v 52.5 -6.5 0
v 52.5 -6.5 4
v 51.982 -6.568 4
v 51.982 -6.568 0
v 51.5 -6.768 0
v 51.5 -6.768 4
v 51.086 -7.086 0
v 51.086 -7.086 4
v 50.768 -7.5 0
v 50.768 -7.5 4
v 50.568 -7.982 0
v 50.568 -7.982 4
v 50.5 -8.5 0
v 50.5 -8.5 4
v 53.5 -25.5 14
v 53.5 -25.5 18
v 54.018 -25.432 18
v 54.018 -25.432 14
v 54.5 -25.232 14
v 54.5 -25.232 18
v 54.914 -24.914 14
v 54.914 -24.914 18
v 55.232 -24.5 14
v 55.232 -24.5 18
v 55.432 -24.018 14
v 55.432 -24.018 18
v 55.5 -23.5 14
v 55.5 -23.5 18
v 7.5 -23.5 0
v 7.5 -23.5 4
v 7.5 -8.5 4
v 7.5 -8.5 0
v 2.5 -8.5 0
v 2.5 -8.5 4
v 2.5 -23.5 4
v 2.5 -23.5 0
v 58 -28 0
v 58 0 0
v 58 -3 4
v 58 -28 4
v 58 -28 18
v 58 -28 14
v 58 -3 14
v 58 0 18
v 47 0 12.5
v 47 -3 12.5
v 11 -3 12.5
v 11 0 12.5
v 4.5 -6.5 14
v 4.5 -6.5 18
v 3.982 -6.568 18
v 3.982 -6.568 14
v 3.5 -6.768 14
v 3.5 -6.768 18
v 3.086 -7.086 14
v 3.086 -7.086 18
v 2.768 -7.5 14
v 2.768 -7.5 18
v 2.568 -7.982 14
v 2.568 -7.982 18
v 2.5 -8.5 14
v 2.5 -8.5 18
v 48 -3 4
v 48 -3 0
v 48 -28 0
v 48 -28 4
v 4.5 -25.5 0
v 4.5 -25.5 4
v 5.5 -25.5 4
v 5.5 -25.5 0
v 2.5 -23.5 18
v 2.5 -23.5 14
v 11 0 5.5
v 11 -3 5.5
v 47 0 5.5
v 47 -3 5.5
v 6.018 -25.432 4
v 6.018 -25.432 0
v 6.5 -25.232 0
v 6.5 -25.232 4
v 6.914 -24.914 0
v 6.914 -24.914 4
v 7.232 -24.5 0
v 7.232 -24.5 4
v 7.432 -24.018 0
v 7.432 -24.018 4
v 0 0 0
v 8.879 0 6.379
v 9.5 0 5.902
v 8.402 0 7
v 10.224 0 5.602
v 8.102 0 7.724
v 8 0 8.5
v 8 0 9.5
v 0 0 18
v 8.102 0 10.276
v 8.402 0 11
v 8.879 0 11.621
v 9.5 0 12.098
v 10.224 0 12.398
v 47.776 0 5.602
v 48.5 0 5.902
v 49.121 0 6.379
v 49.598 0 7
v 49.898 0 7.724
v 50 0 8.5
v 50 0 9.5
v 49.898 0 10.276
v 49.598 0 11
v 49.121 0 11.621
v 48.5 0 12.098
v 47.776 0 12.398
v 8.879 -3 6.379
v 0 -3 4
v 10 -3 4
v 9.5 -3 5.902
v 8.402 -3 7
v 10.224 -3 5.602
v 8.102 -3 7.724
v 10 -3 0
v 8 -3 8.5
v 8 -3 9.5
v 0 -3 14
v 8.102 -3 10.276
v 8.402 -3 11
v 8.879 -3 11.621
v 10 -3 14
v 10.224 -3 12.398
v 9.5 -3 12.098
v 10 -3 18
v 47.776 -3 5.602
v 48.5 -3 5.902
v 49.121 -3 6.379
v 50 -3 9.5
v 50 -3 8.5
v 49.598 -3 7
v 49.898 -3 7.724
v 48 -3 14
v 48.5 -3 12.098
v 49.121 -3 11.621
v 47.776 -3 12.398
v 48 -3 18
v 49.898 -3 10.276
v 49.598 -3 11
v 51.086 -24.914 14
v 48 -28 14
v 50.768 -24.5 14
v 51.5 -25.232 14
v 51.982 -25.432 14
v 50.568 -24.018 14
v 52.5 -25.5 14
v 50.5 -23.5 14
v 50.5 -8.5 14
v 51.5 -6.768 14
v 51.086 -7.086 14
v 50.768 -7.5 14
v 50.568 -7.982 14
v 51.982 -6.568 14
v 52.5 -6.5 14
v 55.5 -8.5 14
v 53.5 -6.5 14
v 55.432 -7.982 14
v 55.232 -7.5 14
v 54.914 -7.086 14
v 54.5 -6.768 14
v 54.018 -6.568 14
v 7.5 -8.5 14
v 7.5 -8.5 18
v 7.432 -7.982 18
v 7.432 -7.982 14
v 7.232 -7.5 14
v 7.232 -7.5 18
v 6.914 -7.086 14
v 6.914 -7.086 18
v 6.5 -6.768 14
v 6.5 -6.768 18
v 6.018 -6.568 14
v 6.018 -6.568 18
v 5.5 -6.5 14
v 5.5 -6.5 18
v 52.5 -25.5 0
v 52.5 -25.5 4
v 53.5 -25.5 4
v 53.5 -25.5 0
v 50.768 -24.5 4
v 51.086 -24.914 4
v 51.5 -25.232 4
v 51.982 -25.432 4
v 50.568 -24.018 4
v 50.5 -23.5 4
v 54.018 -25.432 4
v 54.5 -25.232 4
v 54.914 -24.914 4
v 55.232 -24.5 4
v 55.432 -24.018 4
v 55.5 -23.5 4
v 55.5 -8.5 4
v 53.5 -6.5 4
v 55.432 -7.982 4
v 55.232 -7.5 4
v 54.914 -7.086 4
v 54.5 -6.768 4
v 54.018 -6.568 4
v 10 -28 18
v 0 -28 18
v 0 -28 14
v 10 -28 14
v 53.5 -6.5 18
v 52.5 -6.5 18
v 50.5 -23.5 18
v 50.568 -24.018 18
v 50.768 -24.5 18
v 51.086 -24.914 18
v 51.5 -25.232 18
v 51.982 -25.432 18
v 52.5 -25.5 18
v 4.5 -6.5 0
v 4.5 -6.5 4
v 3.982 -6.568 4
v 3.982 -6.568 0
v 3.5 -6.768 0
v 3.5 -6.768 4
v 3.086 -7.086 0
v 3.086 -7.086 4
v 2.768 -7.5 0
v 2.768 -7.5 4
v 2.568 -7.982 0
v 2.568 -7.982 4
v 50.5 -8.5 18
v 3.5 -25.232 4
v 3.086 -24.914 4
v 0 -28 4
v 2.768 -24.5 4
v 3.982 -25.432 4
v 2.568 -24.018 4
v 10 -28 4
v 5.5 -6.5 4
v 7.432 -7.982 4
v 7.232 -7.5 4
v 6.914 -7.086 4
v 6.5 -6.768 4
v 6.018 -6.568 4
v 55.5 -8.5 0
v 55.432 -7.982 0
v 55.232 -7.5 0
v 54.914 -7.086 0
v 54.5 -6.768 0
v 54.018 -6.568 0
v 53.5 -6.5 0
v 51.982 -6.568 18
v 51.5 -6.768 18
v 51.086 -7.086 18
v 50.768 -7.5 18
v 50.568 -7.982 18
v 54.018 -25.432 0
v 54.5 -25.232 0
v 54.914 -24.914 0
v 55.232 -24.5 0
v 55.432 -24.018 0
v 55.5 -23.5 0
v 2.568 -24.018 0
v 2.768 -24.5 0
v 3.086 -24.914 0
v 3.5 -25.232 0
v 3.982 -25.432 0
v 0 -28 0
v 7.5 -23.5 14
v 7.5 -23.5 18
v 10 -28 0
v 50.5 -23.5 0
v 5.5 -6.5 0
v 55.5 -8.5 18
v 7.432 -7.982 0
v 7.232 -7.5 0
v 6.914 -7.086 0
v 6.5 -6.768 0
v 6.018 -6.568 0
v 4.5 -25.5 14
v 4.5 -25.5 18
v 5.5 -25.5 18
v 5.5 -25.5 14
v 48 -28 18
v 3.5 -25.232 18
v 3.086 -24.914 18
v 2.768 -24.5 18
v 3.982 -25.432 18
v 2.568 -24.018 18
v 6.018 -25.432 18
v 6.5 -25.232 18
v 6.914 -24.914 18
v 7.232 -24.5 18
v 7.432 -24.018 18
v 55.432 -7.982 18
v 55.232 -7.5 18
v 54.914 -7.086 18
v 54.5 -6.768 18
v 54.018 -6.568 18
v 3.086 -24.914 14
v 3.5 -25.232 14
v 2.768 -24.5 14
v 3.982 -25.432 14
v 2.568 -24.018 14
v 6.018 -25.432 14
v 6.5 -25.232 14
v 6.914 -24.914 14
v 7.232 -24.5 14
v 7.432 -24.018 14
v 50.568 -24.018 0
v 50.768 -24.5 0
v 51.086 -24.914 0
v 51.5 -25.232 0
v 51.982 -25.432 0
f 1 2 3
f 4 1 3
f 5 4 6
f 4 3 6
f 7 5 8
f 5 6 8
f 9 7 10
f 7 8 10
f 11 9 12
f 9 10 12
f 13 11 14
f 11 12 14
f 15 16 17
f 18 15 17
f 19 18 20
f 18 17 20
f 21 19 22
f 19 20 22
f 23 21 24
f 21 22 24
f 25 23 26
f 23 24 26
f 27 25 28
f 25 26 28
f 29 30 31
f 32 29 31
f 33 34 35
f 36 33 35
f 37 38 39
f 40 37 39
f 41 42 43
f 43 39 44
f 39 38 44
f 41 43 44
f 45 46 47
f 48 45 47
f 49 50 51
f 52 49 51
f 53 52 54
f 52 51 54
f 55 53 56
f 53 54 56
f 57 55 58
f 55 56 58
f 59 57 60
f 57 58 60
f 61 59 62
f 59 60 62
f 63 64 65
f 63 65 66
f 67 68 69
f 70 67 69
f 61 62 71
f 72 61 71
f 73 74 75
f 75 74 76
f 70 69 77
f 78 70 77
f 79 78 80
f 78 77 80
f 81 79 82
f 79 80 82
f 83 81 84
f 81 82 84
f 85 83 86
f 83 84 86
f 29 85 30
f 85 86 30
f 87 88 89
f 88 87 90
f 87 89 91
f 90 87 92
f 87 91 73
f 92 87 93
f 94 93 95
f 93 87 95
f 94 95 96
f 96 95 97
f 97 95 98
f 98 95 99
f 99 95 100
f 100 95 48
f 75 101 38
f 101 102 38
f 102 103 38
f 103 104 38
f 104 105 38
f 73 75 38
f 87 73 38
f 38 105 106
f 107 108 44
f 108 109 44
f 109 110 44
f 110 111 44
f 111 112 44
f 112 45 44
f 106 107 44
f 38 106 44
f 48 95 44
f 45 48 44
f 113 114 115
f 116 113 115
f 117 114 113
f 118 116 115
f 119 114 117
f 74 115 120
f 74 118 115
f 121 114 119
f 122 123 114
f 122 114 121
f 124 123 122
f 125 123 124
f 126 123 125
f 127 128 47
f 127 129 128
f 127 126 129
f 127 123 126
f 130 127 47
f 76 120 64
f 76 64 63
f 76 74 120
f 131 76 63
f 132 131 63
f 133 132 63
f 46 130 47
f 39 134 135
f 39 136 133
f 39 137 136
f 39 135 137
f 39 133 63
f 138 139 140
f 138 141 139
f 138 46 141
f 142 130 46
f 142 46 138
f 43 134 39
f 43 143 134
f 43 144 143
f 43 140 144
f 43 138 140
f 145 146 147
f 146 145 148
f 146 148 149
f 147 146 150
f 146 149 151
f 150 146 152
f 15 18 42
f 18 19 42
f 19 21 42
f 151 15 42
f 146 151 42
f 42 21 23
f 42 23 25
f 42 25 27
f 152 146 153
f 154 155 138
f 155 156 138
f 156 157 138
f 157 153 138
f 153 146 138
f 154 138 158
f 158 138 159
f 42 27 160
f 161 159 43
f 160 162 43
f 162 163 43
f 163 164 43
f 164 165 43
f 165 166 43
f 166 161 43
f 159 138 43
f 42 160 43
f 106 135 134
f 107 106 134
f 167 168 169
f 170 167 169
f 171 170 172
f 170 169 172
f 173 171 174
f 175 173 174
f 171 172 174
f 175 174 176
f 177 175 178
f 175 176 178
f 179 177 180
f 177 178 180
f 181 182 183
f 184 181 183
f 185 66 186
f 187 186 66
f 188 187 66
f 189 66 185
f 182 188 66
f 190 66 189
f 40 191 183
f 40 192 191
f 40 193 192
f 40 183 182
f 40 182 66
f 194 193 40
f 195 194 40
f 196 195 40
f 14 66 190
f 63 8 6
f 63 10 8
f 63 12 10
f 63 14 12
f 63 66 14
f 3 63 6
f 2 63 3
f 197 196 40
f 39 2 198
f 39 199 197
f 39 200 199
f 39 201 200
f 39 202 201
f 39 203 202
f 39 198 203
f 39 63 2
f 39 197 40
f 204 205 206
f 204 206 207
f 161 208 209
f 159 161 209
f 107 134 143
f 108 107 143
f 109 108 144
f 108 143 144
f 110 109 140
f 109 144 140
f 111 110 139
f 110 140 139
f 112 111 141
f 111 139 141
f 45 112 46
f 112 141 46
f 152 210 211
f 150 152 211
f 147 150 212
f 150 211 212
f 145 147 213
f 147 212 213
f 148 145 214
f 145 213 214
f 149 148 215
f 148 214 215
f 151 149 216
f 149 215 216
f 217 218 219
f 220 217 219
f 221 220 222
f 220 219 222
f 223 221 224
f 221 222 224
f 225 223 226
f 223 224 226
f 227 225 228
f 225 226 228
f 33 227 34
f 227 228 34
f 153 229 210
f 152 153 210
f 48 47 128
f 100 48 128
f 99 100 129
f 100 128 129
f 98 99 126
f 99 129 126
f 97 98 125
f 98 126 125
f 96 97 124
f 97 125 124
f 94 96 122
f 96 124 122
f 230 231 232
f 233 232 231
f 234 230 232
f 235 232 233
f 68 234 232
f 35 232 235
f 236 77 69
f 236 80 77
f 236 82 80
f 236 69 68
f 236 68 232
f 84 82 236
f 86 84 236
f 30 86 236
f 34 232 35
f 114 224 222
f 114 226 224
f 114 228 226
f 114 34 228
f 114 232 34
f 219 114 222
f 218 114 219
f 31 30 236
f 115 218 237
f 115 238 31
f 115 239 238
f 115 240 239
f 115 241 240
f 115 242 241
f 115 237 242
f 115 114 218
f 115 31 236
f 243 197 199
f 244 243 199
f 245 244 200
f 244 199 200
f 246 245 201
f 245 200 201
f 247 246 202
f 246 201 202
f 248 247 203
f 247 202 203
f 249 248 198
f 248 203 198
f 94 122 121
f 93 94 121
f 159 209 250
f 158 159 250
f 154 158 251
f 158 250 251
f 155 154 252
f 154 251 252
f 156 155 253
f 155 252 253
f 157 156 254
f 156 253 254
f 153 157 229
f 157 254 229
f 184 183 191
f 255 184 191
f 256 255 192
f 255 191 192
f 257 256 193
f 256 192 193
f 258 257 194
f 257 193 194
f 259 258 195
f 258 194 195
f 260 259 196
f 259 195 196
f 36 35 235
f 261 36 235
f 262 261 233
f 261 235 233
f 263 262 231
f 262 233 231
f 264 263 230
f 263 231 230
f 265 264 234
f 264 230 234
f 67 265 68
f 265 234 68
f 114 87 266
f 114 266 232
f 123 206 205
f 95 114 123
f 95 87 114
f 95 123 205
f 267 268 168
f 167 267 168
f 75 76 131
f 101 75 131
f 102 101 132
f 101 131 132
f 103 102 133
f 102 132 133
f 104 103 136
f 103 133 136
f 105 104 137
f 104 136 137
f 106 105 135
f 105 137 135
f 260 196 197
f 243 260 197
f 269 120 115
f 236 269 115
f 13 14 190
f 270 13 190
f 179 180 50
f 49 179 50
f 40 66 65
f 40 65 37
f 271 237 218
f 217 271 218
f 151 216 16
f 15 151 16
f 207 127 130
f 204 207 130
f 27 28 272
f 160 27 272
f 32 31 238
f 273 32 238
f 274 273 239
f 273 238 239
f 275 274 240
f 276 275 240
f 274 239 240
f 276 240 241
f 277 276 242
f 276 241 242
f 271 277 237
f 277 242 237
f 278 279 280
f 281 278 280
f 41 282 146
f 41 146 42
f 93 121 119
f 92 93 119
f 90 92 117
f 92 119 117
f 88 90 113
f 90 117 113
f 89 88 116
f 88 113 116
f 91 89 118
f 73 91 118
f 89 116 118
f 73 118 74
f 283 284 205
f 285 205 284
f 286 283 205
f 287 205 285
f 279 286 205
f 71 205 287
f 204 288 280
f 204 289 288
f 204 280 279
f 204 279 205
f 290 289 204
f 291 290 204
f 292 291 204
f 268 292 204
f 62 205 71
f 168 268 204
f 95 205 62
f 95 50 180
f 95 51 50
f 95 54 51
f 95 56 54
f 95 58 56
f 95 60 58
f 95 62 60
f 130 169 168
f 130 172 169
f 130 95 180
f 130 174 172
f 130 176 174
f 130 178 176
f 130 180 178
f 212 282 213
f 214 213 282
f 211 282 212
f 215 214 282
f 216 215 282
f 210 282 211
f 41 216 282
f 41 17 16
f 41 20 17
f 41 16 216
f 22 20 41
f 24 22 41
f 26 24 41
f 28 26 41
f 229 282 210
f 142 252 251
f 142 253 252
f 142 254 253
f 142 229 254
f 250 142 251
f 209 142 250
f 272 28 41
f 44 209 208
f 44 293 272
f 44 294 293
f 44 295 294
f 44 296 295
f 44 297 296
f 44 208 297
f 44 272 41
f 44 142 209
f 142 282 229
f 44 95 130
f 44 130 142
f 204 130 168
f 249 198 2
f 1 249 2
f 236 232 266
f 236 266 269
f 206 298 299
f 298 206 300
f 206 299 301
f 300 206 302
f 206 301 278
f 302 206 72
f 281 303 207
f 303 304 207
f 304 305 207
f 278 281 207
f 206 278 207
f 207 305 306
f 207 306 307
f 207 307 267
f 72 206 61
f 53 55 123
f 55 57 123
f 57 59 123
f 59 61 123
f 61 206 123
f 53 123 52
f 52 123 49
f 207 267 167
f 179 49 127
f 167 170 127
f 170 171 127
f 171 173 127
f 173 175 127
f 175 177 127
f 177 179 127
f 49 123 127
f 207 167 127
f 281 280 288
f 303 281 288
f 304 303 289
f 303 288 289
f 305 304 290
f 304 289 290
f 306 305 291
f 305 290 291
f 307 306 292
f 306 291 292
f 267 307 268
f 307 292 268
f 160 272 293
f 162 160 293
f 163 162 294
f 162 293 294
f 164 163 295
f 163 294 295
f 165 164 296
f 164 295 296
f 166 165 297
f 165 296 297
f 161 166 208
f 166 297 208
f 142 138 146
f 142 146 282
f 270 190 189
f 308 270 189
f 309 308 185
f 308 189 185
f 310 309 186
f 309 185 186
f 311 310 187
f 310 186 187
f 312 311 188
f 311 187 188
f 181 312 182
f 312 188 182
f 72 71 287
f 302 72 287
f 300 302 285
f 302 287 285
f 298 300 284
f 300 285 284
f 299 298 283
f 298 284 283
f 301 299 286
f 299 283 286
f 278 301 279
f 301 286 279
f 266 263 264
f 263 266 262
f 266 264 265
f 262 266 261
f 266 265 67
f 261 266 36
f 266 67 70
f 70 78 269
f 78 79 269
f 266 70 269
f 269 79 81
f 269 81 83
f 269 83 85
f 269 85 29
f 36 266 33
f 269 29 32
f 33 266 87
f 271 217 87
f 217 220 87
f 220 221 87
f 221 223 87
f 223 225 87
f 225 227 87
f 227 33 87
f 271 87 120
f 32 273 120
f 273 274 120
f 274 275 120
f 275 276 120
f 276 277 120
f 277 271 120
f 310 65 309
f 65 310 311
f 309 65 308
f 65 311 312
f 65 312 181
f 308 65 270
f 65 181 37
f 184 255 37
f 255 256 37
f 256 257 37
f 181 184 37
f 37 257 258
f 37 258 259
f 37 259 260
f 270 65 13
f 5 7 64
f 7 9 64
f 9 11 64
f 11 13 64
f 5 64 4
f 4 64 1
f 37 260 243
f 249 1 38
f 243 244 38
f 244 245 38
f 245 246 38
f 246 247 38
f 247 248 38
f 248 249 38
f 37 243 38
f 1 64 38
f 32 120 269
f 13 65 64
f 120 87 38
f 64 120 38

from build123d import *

# Parameters (mm, degrees)
F0_W     = 58
F0_H     = 18
F1_DEPTH = 3
F2_W     = 10
F2_H     = 4
F3_DEPTH = 25
F5_DEPTH = 3.001
F7_DEPTH = 18.001


with BuildPart() as f1:
    # F0 (on Front) → F1 (new body)
    with BuildSketch(Plane.XZ):
        with Locations((29, 9)):
            Rectangle(F0_W, F0_H)
    extrude(amount=F1_DEPTH)

    # F2 (on face) → F3 (join)
    with BuildSketch(Plane.XZ.offset(3)):
        with Locations((53, 16)):
            Rectangle(F2_W, F2_H)
        with Locations((53, 2)):
            Rectangle(F2_W, F2_H)
        with Locations((5, 2)):
            Rectangle(F2_W, F2_H)
        with Locations((5, 16)):
            Rectangle(F2_W, F2_H)
    extrude(amount=F3_DEPTH)

    # F4 (on face) → F5 (cut, through all)
    with BuildSketch(Plane.XZ.offset(3)):
        with BuildLine():
            Line((47, 12.5), (11, 12.5))
            ThreePointArc((11, 12.5), (8.87868, 11.62132), (8, 9.5))
            Line((8, 9.5), (8, 8.5))
            ThreePointArc((8, 8.5), (8.87868, 6.37868), (11, 5.5))
            Line((11, 5.5), (47, 5.5))
            ThreePointArc((47, 5.5), (49.12132, 6.37868), (50, 8.5))
            Line((50, 8.5), (50, 9.5))
            ThreePointArc((50, 9.5), (49.12132, 11.62132), (47, 12.5))
        make_face()
    extrude(amount=-F5_DEPTH, mode=Mode.SUBTRACT)

    # F6 (on face) → F7 (cut, through all)
    with BuildSketch(Plane.XY.offset(18)):
        with BuildLine():
            Line((5.5, -6.5), (4.5, -6.5))
            ThreePointArc((4.5, -6.5), (3.085786, -7.085786), (2.5, -8.5))
            Line((2.5, -8.5), (2.5, -23.5))
            ThreePointArc((2.5, -23.5), (3.085786, -24.914214), (4.5, -25.5))
            Line((4.5, -25.5), (5.5, -25.5))
            ThreePointArc((5.5, -25.5), (6.914214, -24.914214), (7.5, -23.5))
            Line((7.5, -23.5), (7.5, -8.5))
            ThreePointArc((7.5, -8.5), (6.914214, -7.085786), (5.5, -6.5))
        make_face()
        with BuildLine():
            Line((53.5, -6.5), (52.5, -6.5))
            ThreePointArc((52.5, -6.5), (51.085786, -7.085786), (50.5, -8.5))
            Line((50.5, -8.5), (50.5, -23.5))
            ThreePointArc((50.5, -23.5), (51.085786, -24.914214), (52.5, -25.5))
            Line((52.5, -25.5), (53.5, -25.5))
            ThreePointArc((53.5, -25.5), (54.914214, -24.914214), (55.5, -23.5))
            Line((55.5, -23.5), (55.5, -8.5))
            ThreePointArc((55.5, -8.5), (54.914214, -7.085786), (53.5, -6.5))
        make_face()
    extrude(amount=-F7_DEPTH, mode=Mode.SUBTRACT)


solid = f1.part
